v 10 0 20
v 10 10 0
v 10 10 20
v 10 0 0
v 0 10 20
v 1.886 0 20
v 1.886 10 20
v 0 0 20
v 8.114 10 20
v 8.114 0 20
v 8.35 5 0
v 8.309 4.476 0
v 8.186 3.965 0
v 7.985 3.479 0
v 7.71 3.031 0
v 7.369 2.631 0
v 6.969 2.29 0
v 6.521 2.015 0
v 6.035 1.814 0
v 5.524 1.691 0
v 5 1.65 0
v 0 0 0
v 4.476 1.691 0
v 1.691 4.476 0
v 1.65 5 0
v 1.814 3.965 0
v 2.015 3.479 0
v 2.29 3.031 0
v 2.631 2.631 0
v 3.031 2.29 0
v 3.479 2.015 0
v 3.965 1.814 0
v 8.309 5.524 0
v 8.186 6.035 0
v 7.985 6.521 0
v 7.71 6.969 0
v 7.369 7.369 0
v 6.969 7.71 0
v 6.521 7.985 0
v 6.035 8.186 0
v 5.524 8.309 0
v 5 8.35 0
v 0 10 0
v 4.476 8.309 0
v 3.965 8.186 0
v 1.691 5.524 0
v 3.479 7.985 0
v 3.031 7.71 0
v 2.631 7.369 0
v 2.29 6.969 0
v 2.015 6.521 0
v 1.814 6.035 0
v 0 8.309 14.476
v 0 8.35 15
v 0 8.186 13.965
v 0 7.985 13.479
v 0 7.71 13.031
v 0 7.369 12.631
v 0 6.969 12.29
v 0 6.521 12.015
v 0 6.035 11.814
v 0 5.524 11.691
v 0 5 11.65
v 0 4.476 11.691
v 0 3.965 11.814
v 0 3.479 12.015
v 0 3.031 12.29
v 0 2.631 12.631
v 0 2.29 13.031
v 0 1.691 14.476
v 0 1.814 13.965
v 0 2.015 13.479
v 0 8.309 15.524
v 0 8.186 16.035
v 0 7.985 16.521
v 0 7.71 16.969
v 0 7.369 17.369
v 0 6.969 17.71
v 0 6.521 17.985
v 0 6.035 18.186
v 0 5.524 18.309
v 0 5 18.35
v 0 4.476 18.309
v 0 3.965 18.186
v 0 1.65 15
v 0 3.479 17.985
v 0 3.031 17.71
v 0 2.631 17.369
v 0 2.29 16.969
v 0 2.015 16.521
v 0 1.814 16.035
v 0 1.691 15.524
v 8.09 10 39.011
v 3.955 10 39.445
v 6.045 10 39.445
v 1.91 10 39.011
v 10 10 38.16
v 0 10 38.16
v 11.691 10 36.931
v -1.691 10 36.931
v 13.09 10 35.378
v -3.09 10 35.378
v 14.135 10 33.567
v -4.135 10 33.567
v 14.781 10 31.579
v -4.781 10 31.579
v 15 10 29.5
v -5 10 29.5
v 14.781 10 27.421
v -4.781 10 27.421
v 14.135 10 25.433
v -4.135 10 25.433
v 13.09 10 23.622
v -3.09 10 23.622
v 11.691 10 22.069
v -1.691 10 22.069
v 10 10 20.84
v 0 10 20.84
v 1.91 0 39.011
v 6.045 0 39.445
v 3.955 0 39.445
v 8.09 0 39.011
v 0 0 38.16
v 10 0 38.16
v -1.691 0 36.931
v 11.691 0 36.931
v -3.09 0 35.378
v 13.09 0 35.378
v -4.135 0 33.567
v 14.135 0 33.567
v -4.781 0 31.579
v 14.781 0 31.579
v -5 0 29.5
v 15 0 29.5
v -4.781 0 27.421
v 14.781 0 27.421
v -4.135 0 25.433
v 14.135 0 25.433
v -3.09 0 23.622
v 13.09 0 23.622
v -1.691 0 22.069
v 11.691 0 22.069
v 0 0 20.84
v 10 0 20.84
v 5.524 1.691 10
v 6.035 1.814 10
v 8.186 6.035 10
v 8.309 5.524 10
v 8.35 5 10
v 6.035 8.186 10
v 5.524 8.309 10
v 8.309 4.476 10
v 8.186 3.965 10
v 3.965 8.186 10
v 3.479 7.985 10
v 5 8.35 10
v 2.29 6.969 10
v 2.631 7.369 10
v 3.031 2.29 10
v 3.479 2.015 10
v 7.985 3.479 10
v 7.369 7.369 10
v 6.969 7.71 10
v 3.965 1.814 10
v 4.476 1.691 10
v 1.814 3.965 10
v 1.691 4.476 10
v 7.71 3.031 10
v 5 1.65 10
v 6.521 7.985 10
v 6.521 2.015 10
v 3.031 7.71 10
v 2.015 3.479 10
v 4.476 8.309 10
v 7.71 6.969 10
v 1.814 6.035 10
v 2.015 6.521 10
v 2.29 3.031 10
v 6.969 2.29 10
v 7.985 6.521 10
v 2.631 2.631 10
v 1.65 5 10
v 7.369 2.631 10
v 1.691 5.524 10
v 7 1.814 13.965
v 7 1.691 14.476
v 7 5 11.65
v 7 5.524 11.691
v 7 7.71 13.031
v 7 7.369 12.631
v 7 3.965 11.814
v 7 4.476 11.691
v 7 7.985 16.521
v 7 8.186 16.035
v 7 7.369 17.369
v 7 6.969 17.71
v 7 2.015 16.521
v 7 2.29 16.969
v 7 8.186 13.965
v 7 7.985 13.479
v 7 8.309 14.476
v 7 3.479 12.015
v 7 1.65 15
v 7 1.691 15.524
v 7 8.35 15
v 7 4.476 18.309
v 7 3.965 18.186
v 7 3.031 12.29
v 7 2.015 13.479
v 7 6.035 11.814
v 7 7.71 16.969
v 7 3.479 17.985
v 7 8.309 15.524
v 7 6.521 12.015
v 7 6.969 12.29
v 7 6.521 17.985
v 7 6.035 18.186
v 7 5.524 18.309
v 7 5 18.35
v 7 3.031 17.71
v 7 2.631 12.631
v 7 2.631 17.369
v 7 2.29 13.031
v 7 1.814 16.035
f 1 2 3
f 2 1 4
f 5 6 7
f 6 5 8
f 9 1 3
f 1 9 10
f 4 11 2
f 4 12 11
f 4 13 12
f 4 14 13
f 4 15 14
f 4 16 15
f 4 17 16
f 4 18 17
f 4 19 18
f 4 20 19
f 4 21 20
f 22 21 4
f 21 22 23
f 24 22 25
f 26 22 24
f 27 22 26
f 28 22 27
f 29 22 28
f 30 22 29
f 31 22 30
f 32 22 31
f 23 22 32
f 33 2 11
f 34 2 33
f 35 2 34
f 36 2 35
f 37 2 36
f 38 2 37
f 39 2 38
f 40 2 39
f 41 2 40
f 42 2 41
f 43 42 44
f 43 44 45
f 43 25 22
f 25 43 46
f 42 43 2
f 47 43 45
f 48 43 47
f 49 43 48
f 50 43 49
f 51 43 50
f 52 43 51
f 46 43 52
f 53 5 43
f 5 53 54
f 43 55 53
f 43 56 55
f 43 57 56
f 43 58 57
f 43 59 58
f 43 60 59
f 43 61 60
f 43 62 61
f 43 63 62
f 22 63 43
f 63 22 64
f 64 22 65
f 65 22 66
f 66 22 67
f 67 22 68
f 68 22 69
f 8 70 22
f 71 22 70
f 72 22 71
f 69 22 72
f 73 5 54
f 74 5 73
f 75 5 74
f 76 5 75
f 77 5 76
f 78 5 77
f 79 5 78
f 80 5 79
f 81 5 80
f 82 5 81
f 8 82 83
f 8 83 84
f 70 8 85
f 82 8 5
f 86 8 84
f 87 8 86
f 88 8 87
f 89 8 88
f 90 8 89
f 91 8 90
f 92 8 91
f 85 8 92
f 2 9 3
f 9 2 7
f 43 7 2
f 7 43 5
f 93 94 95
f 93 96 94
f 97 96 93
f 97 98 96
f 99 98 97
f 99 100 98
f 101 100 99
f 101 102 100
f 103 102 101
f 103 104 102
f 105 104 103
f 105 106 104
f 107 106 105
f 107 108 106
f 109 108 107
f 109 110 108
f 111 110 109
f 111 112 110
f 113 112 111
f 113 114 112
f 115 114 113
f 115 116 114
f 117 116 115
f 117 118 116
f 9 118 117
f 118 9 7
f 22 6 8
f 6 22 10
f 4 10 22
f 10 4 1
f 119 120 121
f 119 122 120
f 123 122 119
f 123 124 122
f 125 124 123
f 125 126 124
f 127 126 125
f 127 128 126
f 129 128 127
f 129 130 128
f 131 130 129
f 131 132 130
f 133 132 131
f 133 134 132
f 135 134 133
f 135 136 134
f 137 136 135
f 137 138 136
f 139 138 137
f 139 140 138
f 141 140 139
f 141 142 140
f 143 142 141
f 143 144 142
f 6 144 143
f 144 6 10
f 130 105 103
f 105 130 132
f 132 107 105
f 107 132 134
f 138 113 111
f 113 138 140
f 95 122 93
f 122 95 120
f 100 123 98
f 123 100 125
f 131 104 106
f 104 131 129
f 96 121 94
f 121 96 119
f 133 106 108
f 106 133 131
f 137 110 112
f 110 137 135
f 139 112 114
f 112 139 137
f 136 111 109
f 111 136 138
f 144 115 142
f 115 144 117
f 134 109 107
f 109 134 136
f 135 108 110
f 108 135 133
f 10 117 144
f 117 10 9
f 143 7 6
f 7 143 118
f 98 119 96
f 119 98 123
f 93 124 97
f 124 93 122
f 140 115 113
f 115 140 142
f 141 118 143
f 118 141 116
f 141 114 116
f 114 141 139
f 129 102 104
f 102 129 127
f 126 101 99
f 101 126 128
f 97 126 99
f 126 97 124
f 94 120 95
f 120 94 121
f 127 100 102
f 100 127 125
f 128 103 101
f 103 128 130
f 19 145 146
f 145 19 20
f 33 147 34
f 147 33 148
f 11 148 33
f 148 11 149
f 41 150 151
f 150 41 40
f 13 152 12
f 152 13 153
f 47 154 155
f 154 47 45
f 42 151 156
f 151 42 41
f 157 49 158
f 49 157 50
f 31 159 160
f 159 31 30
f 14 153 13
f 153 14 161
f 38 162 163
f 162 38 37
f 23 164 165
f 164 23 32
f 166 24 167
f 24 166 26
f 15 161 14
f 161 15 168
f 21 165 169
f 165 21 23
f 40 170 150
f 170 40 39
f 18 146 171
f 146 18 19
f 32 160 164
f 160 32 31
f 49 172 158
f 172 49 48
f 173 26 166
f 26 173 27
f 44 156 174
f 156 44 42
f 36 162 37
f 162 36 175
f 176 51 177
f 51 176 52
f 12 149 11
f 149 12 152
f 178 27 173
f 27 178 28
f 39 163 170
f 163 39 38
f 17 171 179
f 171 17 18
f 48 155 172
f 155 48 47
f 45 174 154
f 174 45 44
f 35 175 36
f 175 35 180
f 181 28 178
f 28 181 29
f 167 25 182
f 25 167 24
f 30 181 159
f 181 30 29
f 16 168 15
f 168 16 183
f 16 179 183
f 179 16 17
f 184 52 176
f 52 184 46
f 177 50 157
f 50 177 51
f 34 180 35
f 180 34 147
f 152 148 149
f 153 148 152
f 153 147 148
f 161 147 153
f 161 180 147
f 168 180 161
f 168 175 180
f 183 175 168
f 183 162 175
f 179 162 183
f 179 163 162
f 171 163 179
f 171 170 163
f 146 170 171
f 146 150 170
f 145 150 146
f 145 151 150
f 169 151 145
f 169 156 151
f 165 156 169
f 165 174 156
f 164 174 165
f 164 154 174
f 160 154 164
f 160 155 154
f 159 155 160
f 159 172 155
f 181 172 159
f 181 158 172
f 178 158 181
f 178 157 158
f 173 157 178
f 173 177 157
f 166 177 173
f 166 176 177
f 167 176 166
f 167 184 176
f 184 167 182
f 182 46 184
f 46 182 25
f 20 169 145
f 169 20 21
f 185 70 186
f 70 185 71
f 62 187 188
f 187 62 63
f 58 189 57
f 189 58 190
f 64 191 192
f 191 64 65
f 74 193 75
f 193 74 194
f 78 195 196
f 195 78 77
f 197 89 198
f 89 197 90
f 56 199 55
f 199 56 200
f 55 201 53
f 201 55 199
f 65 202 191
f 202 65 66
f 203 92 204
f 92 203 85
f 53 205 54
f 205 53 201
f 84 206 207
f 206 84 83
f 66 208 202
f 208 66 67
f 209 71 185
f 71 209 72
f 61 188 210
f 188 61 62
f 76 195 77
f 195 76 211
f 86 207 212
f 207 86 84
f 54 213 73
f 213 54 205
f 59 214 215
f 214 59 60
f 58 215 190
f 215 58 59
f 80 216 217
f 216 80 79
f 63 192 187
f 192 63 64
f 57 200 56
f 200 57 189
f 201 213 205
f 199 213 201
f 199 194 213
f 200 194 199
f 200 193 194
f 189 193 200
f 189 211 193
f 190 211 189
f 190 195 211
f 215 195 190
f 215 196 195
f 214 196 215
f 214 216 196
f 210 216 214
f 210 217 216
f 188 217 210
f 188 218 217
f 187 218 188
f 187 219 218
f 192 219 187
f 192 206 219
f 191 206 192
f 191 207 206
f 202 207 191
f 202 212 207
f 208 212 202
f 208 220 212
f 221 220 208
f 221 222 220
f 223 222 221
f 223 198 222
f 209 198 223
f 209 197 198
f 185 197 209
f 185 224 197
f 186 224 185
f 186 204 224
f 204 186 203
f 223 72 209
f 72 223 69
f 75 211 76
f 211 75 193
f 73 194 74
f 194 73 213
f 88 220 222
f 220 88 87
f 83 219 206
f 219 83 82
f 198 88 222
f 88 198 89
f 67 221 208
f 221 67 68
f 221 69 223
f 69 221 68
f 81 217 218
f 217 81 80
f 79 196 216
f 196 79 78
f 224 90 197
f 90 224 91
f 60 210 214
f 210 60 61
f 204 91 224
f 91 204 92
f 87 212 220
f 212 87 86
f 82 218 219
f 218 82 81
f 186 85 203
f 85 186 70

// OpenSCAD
pip=3.35;
module poleConnector(pip=3.35){
    cube_die=[10,10,20];//the cube dimentions
    difference(){
        cube(cube_die);
        translate([5,5,0])cylinder(r=pip,h=10,$fn=40);
        translate([0,5,15])rotate([0,90,0])cylinder(r=pip,h=10-3,$fn=40);
    }
}
module poleClip(pip=3.35){
    difference(){
    union(){
        cylinder(r=pip+3,h=10,$fn=40);
        translate([0,-2.5,0])cube([15,5,10]);
    }

    union(){
        cylinder(r=pip,h=10,$fn=40);
        translate([0,-1,0])cube([15,2,10]);
        rotate([90,0,0]){
            translate([11,5,-2.5]){
                cylinder(r=2,h=5,$fn=40);
            }
        }
    }
}

}
module CM(pip){
    camera = 10;
    cube_die=[10,10,20];//the cube dimentions
    difference(){
        union(){
          cube(cube_die);
          translate([10/2,10,20+camera-0.5])rotate([90,0,0])linear_extrude(10)circle(r=camera);
        }
        translate([5,5,0])cylinder(r=pip,h=10,$fn=40);
        translate([0,5,15]){
            rotate([0,90,0]){
                cylinder(r=pip,h=10-3,$fn=40);
              }
          }
      }
    translate([10/2,10,20+camera-0.5])rotate([90,0,0])linear_extrude(10)circle(r=camera);
}
CM(pip);
